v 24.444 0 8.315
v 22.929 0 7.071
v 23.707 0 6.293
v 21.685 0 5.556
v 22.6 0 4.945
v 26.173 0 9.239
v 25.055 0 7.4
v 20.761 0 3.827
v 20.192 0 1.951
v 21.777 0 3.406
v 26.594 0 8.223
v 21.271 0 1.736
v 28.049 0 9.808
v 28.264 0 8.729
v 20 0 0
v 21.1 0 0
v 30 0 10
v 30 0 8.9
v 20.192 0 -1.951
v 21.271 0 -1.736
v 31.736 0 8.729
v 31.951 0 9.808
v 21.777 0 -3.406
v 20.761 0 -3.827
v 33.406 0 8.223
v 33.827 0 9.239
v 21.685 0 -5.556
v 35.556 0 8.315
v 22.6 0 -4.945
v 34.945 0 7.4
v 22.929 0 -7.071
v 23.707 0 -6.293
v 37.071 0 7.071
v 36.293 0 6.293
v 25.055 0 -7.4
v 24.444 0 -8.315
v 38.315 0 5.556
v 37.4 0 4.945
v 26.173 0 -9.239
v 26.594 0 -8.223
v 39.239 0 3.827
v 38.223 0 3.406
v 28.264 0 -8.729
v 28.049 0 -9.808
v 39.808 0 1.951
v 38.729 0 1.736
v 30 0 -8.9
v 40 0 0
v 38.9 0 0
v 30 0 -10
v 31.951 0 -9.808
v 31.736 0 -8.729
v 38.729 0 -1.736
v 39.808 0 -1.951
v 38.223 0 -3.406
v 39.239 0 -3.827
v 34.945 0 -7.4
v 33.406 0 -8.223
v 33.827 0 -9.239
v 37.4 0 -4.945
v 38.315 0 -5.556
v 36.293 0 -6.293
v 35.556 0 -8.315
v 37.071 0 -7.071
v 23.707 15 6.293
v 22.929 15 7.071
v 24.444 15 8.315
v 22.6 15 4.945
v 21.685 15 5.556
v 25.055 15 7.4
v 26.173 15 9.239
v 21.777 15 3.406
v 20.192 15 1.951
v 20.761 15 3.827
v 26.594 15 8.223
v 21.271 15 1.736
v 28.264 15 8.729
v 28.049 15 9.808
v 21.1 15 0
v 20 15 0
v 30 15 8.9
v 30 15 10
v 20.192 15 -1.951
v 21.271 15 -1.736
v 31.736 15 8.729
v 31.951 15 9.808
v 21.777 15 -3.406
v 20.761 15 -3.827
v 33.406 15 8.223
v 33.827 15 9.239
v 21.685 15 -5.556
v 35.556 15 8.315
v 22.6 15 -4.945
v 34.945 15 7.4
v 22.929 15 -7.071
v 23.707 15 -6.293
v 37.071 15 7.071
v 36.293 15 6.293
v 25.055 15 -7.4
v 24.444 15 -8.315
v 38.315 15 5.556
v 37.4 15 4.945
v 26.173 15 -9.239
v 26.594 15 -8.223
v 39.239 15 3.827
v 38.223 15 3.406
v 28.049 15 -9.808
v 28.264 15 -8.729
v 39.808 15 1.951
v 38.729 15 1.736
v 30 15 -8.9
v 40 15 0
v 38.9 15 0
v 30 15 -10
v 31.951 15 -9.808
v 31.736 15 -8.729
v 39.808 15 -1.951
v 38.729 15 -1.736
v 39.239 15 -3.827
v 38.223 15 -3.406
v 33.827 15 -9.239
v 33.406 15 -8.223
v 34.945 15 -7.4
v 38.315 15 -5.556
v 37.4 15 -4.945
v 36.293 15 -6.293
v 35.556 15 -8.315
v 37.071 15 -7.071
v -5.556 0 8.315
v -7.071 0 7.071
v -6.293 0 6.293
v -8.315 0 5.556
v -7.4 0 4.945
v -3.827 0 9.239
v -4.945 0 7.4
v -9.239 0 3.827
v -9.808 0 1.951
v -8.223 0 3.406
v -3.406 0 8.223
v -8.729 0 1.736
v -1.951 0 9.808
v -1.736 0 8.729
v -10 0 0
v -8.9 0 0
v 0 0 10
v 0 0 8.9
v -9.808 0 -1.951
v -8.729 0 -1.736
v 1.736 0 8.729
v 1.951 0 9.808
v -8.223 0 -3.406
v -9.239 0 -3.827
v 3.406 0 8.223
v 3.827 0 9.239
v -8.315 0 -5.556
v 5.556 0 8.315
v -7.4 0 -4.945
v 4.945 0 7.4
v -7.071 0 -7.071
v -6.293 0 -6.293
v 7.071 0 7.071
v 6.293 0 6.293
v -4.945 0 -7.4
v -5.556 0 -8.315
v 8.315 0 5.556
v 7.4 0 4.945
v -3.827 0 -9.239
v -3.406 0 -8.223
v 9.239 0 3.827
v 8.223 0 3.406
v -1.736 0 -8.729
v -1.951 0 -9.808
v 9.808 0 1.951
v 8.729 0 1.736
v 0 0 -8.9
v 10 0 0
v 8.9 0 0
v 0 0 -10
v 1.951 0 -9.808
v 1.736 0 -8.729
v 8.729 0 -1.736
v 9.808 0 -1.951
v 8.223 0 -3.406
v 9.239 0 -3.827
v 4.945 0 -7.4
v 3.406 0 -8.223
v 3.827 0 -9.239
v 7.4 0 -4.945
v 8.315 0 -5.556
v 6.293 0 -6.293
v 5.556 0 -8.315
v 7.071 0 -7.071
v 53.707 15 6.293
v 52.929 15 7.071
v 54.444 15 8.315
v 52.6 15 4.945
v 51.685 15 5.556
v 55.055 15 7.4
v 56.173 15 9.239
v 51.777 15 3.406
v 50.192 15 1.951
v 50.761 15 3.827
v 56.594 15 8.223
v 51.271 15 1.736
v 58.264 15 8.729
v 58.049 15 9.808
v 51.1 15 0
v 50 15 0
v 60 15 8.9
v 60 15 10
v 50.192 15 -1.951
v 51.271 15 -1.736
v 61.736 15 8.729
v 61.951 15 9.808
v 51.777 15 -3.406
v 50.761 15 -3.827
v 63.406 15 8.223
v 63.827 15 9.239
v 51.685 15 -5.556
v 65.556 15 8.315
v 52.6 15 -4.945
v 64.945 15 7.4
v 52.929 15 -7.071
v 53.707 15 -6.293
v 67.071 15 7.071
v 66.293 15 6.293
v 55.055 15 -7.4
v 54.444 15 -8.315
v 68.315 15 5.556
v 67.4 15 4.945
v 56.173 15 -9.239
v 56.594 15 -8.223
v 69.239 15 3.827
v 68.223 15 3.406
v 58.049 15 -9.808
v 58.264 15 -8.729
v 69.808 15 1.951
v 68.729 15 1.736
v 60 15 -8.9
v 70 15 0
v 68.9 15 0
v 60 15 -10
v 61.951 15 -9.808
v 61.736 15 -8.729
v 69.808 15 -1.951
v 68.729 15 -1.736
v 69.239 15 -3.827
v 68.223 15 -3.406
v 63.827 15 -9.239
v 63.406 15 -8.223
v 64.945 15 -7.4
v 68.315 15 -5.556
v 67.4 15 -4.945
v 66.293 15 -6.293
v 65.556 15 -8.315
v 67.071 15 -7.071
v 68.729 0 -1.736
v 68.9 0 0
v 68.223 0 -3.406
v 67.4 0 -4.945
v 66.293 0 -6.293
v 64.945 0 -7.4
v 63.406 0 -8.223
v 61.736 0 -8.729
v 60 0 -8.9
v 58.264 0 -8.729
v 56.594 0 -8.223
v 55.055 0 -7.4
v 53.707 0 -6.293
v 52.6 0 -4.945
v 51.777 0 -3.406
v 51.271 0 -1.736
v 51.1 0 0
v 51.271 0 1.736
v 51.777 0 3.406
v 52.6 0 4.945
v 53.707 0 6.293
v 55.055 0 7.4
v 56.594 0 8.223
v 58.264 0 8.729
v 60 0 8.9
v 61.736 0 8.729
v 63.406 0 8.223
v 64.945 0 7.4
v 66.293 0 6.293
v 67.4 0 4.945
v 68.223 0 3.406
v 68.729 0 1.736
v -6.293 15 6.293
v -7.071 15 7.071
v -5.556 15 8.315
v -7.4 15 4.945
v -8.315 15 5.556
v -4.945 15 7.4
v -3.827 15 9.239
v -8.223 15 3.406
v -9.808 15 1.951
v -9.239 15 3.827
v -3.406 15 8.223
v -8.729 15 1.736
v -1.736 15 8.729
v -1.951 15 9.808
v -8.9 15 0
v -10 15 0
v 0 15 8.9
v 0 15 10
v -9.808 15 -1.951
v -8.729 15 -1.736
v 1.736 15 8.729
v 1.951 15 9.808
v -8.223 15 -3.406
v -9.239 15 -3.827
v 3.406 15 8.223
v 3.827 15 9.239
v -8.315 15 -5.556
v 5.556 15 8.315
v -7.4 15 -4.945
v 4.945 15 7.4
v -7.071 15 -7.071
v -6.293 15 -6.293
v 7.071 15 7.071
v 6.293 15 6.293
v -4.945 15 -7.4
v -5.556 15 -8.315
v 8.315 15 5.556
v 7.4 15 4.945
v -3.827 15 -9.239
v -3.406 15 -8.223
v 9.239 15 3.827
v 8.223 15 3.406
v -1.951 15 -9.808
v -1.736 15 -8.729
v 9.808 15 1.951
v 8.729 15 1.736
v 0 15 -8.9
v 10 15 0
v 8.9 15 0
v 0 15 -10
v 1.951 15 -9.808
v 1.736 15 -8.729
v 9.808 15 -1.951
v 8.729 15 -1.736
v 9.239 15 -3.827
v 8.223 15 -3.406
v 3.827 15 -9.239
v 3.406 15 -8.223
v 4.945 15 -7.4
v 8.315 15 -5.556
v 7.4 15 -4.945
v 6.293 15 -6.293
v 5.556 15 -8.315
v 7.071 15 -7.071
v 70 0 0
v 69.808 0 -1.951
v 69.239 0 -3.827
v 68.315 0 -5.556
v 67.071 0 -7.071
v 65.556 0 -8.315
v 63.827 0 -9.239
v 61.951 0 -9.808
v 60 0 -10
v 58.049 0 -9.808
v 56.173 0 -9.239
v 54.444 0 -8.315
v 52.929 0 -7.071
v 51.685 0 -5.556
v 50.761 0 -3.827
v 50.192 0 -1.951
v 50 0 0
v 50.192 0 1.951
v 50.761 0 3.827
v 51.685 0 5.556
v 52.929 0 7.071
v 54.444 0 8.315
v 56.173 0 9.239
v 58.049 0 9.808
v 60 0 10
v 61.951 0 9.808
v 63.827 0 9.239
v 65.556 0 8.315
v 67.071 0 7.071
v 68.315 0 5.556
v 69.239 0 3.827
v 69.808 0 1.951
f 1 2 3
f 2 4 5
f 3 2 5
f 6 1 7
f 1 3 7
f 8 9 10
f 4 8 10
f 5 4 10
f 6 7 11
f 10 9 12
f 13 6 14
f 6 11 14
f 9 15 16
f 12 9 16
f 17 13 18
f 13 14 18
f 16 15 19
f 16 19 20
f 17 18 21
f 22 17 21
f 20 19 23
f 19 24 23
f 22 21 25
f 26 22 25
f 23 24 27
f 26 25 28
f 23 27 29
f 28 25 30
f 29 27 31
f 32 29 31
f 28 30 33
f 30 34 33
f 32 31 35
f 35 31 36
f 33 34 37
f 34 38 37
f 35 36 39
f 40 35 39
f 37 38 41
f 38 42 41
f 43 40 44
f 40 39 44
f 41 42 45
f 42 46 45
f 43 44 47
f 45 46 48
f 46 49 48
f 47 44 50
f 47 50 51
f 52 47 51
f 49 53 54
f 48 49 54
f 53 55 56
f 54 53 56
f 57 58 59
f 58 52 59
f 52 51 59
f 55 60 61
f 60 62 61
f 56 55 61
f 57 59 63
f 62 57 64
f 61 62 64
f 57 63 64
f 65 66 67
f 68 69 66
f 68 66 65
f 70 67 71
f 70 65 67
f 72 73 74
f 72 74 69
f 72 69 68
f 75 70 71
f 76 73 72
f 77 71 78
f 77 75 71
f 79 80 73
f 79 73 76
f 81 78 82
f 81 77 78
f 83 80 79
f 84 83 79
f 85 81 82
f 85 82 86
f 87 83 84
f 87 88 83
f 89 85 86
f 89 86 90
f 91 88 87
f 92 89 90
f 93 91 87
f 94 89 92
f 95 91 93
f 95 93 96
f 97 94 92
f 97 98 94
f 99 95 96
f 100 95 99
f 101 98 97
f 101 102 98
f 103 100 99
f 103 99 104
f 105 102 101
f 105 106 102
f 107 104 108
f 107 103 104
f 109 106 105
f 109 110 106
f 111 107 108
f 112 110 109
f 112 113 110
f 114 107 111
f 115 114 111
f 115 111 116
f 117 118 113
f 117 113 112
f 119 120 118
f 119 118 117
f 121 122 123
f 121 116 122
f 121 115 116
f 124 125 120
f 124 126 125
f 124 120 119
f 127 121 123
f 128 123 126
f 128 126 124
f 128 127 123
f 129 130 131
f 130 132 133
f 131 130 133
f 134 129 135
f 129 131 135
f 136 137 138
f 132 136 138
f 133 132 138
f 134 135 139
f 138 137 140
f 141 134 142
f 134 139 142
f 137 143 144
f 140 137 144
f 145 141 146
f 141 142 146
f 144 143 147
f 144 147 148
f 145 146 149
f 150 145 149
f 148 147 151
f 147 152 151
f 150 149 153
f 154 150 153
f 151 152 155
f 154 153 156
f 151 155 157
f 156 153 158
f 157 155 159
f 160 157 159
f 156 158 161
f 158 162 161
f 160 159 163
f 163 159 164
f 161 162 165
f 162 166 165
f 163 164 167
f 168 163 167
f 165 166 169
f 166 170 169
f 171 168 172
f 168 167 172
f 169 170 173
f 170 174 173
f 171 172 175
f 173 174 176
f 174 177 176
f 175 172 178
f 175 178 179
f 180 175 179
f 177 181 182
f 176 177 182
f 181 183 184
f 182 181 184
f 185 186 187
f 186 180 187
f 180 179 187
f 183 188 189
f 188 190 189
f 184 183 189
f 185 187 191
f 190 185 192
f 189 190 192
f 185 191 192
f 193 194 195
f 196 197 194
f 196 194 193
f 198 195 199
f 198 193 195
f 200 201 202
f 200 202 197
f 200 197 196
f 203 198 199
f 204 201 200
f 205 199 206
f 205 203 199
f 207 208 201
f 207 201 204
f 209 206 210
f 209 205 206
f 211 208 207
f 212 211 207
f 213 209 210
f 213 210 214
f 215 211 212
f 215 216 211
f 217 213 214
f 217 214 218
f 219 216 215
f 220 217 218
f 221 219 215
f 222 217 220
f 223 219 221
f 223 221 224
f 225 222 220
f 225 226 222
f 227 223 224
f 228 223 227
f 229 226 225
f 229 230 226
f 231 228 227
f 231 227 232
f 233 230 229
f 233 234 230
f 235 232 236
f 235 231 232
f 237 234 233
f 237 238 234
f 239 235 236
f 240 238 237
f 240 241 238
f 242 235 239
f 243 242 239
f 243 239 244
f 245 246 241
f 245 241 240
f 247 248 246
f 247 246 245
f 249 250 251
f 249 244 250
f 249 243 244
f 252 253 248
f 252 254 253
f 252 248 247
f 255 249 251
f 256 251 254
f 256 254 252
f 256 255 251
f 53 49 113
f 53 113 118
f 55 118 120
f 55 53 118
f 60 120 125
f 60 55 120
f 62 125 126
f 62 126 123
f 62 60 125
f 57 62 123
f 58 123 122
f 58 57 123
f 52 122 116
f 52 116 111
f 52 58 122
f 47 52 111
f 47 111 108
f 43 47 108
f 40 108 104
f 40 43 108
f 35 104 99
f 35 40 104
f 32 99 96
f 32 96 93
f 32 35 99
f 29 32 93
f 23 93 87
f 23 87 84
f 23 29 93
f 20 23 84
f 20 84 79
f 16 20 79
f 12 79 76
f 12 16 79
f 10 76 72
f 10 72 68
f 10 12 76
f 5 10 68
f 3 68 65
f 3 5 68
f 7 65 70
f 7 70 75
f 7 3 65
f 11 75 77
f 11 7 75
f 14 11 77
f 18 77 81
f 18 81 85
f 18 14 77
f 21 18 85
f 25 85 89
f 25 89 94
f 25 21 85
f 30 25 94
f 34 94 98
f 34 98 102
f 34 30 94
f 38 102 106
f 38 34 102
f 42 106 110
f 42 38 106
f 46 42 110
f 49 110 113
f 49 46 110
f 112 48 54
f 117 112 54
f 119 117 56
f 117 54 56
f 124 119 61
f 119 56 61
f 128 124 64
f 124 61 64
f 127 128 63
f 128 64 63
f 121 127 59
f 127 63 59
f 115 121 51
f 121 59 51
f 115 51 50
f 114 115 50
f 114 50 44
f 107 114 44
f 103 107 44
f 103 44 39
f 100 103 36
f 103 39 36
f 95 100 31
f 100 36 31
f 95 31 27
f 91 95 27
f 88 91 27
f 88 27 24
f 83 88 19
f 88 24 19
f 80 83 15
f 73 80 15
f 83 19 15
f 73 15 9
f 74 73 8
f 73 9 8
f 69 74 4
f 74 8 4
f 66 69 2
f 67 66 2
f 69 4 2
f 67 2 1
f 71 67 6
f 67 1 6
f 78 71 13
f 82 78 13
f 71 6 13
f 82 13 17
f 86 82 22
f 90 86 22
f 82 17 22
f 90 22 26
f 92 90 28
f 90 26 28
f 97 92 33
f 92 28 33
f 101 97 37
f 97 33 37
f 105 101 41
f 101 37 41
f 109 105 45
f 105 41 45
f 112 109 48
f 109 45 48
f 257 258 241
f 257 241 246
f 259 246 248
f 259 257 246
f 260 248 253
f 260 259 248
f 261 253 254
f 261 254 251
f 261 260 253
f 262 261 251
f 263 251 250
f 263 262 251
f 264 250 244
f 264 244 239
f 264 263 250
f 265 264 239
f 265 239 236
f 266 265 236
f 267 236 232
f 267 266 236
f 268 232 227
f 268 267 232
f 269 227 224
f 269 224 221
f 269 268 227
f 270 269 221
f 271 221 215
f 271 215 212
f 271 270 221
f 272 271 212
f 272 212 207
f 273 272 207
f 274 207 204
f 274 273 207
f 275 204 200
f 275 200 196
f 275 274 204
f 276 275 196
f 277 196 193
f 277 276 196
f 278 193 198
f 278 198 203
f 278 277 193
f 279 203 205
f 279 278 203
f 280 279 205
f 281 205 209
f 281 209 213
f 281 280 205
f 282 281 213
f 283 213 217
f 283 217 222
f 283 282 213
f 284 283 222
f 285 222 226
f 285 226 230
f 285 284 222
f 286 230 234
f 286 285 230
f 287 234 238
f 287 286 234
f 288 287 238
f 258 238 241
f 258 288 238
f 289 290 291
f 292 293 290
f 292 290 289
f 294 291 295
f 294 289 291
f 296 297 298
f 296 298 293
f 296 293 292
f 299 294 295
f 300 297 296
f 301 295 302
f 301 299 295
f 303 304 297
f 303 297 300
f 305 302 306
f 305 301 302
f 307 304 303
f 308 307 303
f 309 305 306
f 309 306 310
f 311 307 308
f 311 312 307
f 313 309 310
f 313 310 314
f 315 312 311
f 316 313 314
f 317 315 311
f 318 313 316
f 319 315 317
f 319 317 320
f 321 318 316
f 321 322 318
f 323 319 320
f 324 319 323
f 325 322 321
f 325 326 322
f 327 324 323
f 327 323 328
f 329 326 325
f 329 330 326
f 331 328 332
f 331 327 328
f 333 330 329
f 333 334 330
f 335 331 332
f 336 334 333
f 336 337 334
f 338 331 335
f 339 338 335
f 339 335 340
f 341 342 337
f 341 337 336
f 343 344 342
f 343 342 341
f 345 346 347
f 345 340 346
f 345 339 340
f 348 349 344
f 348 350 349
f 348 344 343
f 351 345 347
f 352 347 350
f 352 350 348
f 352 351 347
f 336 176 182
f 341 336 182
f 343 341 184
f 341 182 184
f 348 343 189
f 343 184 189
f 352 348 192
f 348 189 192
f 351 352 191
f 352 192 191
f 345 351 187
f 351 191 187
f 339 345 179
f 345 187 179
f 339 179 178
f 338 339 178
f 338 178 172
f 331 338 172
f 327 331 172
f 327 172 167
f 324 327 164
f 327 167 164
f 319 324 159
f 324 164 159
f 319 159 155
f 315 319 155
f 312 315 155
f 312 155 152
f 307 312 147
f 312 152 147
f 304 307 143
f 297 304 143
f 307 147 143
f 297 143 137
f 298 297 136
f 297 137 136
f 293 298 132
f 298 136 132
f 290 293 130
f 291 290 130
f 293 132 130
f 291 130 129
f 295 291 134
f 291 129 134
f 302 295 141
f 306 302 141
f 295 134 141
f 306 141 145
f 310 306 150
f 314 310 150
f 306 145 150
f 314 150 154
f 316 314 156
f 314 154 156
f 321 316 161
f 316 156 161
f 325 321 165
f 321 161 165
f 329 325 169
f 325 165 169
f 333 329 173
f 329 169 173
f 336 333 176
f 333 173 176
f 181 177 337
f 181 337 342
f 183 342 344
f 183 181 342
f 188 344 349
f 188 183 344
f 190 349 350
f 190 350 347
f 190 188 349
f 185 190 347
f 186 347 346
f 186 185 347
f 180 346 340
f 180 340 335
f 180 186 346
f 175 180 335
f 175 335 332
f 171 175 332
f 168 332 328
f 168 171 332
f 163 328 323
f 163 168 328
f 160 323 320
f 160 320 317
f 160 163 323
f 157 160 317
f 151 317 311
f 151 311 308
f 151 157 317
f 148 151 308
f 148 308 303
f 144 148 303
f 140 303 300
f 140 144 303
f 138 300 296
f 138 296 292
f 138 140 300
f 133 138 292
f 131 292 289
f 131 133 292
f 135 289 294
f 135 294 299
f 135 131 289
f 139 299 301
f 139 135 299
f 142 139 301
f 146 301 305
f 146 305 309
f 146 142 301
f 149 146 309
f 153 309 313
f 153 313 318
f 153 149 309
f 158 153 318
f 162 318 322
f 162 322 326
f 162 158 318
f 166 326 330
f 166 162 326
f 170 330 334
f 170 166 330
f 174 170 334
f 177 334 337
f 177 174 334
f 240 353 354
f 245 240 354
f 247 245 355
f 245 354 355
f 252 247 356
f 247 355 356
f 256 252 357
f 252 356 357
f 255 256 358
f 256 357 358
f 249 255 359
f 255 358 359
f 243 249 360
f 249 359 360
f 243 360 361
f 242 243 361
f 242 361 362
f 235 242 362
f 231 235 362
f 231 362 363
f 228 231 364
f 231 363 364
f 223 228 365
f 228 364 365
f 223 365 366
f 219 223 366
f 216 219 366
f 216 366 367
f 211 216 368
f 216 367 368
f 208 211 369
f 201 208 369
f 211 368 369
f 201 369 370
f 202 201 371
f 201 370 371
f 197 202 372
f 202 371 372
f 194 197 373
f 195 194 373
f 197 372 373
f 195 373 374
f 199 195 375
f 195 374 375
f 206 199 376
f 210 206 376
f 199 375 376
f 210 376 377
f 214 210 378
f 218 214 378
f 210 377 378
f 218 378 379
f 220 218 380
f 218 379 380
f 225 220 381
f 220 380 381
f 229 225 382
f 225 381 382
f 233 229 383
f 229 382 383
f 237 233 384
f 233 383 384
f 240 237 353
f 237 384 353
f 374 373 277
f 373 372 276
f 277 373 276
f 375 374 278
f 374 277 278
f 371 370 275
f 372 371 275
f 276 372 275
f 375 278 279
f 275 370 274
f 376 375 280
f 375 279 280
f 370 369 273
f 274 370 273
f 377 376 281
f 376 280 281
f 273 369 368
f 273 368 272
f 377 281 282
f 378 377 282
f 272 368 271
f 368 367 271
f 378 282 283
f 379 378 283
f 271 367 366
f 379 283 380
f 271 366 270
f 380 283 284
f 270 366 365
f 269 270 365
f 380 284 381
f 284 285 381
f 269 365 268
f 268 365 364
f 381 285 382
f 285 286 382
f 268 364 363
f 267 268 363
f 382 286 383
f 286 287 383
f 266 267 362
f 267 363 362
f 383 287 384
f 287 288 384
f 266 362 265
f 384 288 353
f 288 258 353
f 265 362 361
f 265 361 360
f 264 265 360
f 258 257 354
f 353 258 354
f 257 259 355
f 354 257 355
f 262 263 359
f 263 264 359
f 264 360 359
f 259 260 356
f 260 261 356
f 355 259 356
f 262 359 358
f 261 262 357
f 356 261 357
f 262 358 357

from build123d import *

# Parameters (mm, degrees)
SKETCH_1_R        = 10
SKETCH_1_R_2      = 8.9
EXTRUDE_1_DEPTH   = 15
EXTRUDE_1_2_DEPTH = 15
EXTRUDE_1_3_DEPTH = 15


with BuildPart() as part:
    # 草图1 → 拉伸-薄壁1 (new body)
    with BuildSketch(Plane(origin=(0, 0, 0), x_dir=(1, 0, 0), z_dir=(0, 1, 0))):
        Circle(SKETCH_1_R)
        Circle(SKETCH_1_R_2, mode=Mode.SUBTRACT)
    extrude(amount=EXTRUDE_1_DEPTH)


with BuildPart() as body_2:
    # 草图1 → Extrude 1 2 (new body)
    with BuildSketch(Plane(origin=(0, 0, 0), x_dir=(1, 0, 0), z_dir=(0, 1, 0))):
        with Locations((30, 0)):
            Circle(SKETCH_1_R)
        with Locations((30, 0)):
            Circle(SKETCH_1_R_2, mode=Mode.SUBTRACT)
    extrude(amount=EXTRUDE_1_2_DEPTH)


with BuildPart() as body_3:
    # 草图1 → Extrude 1 3 (new body)
    with BuildSketch(Plane(origin=(0, 0, 0), x_dir=(1, 0, 0), z_dir=(0, 1, 0))):
        with Locations((60, 0)):
            Circle(SKETCH_1_R)
        with Locations((60, 0)):
            Circle(SKETCH_1_R_2, mode=Mode.SUBTRACT)
    extrude(amount=EXTRUDE_1_3_DEPTH)


solid = Compound([part.part, body_2.part, body_3.part])
